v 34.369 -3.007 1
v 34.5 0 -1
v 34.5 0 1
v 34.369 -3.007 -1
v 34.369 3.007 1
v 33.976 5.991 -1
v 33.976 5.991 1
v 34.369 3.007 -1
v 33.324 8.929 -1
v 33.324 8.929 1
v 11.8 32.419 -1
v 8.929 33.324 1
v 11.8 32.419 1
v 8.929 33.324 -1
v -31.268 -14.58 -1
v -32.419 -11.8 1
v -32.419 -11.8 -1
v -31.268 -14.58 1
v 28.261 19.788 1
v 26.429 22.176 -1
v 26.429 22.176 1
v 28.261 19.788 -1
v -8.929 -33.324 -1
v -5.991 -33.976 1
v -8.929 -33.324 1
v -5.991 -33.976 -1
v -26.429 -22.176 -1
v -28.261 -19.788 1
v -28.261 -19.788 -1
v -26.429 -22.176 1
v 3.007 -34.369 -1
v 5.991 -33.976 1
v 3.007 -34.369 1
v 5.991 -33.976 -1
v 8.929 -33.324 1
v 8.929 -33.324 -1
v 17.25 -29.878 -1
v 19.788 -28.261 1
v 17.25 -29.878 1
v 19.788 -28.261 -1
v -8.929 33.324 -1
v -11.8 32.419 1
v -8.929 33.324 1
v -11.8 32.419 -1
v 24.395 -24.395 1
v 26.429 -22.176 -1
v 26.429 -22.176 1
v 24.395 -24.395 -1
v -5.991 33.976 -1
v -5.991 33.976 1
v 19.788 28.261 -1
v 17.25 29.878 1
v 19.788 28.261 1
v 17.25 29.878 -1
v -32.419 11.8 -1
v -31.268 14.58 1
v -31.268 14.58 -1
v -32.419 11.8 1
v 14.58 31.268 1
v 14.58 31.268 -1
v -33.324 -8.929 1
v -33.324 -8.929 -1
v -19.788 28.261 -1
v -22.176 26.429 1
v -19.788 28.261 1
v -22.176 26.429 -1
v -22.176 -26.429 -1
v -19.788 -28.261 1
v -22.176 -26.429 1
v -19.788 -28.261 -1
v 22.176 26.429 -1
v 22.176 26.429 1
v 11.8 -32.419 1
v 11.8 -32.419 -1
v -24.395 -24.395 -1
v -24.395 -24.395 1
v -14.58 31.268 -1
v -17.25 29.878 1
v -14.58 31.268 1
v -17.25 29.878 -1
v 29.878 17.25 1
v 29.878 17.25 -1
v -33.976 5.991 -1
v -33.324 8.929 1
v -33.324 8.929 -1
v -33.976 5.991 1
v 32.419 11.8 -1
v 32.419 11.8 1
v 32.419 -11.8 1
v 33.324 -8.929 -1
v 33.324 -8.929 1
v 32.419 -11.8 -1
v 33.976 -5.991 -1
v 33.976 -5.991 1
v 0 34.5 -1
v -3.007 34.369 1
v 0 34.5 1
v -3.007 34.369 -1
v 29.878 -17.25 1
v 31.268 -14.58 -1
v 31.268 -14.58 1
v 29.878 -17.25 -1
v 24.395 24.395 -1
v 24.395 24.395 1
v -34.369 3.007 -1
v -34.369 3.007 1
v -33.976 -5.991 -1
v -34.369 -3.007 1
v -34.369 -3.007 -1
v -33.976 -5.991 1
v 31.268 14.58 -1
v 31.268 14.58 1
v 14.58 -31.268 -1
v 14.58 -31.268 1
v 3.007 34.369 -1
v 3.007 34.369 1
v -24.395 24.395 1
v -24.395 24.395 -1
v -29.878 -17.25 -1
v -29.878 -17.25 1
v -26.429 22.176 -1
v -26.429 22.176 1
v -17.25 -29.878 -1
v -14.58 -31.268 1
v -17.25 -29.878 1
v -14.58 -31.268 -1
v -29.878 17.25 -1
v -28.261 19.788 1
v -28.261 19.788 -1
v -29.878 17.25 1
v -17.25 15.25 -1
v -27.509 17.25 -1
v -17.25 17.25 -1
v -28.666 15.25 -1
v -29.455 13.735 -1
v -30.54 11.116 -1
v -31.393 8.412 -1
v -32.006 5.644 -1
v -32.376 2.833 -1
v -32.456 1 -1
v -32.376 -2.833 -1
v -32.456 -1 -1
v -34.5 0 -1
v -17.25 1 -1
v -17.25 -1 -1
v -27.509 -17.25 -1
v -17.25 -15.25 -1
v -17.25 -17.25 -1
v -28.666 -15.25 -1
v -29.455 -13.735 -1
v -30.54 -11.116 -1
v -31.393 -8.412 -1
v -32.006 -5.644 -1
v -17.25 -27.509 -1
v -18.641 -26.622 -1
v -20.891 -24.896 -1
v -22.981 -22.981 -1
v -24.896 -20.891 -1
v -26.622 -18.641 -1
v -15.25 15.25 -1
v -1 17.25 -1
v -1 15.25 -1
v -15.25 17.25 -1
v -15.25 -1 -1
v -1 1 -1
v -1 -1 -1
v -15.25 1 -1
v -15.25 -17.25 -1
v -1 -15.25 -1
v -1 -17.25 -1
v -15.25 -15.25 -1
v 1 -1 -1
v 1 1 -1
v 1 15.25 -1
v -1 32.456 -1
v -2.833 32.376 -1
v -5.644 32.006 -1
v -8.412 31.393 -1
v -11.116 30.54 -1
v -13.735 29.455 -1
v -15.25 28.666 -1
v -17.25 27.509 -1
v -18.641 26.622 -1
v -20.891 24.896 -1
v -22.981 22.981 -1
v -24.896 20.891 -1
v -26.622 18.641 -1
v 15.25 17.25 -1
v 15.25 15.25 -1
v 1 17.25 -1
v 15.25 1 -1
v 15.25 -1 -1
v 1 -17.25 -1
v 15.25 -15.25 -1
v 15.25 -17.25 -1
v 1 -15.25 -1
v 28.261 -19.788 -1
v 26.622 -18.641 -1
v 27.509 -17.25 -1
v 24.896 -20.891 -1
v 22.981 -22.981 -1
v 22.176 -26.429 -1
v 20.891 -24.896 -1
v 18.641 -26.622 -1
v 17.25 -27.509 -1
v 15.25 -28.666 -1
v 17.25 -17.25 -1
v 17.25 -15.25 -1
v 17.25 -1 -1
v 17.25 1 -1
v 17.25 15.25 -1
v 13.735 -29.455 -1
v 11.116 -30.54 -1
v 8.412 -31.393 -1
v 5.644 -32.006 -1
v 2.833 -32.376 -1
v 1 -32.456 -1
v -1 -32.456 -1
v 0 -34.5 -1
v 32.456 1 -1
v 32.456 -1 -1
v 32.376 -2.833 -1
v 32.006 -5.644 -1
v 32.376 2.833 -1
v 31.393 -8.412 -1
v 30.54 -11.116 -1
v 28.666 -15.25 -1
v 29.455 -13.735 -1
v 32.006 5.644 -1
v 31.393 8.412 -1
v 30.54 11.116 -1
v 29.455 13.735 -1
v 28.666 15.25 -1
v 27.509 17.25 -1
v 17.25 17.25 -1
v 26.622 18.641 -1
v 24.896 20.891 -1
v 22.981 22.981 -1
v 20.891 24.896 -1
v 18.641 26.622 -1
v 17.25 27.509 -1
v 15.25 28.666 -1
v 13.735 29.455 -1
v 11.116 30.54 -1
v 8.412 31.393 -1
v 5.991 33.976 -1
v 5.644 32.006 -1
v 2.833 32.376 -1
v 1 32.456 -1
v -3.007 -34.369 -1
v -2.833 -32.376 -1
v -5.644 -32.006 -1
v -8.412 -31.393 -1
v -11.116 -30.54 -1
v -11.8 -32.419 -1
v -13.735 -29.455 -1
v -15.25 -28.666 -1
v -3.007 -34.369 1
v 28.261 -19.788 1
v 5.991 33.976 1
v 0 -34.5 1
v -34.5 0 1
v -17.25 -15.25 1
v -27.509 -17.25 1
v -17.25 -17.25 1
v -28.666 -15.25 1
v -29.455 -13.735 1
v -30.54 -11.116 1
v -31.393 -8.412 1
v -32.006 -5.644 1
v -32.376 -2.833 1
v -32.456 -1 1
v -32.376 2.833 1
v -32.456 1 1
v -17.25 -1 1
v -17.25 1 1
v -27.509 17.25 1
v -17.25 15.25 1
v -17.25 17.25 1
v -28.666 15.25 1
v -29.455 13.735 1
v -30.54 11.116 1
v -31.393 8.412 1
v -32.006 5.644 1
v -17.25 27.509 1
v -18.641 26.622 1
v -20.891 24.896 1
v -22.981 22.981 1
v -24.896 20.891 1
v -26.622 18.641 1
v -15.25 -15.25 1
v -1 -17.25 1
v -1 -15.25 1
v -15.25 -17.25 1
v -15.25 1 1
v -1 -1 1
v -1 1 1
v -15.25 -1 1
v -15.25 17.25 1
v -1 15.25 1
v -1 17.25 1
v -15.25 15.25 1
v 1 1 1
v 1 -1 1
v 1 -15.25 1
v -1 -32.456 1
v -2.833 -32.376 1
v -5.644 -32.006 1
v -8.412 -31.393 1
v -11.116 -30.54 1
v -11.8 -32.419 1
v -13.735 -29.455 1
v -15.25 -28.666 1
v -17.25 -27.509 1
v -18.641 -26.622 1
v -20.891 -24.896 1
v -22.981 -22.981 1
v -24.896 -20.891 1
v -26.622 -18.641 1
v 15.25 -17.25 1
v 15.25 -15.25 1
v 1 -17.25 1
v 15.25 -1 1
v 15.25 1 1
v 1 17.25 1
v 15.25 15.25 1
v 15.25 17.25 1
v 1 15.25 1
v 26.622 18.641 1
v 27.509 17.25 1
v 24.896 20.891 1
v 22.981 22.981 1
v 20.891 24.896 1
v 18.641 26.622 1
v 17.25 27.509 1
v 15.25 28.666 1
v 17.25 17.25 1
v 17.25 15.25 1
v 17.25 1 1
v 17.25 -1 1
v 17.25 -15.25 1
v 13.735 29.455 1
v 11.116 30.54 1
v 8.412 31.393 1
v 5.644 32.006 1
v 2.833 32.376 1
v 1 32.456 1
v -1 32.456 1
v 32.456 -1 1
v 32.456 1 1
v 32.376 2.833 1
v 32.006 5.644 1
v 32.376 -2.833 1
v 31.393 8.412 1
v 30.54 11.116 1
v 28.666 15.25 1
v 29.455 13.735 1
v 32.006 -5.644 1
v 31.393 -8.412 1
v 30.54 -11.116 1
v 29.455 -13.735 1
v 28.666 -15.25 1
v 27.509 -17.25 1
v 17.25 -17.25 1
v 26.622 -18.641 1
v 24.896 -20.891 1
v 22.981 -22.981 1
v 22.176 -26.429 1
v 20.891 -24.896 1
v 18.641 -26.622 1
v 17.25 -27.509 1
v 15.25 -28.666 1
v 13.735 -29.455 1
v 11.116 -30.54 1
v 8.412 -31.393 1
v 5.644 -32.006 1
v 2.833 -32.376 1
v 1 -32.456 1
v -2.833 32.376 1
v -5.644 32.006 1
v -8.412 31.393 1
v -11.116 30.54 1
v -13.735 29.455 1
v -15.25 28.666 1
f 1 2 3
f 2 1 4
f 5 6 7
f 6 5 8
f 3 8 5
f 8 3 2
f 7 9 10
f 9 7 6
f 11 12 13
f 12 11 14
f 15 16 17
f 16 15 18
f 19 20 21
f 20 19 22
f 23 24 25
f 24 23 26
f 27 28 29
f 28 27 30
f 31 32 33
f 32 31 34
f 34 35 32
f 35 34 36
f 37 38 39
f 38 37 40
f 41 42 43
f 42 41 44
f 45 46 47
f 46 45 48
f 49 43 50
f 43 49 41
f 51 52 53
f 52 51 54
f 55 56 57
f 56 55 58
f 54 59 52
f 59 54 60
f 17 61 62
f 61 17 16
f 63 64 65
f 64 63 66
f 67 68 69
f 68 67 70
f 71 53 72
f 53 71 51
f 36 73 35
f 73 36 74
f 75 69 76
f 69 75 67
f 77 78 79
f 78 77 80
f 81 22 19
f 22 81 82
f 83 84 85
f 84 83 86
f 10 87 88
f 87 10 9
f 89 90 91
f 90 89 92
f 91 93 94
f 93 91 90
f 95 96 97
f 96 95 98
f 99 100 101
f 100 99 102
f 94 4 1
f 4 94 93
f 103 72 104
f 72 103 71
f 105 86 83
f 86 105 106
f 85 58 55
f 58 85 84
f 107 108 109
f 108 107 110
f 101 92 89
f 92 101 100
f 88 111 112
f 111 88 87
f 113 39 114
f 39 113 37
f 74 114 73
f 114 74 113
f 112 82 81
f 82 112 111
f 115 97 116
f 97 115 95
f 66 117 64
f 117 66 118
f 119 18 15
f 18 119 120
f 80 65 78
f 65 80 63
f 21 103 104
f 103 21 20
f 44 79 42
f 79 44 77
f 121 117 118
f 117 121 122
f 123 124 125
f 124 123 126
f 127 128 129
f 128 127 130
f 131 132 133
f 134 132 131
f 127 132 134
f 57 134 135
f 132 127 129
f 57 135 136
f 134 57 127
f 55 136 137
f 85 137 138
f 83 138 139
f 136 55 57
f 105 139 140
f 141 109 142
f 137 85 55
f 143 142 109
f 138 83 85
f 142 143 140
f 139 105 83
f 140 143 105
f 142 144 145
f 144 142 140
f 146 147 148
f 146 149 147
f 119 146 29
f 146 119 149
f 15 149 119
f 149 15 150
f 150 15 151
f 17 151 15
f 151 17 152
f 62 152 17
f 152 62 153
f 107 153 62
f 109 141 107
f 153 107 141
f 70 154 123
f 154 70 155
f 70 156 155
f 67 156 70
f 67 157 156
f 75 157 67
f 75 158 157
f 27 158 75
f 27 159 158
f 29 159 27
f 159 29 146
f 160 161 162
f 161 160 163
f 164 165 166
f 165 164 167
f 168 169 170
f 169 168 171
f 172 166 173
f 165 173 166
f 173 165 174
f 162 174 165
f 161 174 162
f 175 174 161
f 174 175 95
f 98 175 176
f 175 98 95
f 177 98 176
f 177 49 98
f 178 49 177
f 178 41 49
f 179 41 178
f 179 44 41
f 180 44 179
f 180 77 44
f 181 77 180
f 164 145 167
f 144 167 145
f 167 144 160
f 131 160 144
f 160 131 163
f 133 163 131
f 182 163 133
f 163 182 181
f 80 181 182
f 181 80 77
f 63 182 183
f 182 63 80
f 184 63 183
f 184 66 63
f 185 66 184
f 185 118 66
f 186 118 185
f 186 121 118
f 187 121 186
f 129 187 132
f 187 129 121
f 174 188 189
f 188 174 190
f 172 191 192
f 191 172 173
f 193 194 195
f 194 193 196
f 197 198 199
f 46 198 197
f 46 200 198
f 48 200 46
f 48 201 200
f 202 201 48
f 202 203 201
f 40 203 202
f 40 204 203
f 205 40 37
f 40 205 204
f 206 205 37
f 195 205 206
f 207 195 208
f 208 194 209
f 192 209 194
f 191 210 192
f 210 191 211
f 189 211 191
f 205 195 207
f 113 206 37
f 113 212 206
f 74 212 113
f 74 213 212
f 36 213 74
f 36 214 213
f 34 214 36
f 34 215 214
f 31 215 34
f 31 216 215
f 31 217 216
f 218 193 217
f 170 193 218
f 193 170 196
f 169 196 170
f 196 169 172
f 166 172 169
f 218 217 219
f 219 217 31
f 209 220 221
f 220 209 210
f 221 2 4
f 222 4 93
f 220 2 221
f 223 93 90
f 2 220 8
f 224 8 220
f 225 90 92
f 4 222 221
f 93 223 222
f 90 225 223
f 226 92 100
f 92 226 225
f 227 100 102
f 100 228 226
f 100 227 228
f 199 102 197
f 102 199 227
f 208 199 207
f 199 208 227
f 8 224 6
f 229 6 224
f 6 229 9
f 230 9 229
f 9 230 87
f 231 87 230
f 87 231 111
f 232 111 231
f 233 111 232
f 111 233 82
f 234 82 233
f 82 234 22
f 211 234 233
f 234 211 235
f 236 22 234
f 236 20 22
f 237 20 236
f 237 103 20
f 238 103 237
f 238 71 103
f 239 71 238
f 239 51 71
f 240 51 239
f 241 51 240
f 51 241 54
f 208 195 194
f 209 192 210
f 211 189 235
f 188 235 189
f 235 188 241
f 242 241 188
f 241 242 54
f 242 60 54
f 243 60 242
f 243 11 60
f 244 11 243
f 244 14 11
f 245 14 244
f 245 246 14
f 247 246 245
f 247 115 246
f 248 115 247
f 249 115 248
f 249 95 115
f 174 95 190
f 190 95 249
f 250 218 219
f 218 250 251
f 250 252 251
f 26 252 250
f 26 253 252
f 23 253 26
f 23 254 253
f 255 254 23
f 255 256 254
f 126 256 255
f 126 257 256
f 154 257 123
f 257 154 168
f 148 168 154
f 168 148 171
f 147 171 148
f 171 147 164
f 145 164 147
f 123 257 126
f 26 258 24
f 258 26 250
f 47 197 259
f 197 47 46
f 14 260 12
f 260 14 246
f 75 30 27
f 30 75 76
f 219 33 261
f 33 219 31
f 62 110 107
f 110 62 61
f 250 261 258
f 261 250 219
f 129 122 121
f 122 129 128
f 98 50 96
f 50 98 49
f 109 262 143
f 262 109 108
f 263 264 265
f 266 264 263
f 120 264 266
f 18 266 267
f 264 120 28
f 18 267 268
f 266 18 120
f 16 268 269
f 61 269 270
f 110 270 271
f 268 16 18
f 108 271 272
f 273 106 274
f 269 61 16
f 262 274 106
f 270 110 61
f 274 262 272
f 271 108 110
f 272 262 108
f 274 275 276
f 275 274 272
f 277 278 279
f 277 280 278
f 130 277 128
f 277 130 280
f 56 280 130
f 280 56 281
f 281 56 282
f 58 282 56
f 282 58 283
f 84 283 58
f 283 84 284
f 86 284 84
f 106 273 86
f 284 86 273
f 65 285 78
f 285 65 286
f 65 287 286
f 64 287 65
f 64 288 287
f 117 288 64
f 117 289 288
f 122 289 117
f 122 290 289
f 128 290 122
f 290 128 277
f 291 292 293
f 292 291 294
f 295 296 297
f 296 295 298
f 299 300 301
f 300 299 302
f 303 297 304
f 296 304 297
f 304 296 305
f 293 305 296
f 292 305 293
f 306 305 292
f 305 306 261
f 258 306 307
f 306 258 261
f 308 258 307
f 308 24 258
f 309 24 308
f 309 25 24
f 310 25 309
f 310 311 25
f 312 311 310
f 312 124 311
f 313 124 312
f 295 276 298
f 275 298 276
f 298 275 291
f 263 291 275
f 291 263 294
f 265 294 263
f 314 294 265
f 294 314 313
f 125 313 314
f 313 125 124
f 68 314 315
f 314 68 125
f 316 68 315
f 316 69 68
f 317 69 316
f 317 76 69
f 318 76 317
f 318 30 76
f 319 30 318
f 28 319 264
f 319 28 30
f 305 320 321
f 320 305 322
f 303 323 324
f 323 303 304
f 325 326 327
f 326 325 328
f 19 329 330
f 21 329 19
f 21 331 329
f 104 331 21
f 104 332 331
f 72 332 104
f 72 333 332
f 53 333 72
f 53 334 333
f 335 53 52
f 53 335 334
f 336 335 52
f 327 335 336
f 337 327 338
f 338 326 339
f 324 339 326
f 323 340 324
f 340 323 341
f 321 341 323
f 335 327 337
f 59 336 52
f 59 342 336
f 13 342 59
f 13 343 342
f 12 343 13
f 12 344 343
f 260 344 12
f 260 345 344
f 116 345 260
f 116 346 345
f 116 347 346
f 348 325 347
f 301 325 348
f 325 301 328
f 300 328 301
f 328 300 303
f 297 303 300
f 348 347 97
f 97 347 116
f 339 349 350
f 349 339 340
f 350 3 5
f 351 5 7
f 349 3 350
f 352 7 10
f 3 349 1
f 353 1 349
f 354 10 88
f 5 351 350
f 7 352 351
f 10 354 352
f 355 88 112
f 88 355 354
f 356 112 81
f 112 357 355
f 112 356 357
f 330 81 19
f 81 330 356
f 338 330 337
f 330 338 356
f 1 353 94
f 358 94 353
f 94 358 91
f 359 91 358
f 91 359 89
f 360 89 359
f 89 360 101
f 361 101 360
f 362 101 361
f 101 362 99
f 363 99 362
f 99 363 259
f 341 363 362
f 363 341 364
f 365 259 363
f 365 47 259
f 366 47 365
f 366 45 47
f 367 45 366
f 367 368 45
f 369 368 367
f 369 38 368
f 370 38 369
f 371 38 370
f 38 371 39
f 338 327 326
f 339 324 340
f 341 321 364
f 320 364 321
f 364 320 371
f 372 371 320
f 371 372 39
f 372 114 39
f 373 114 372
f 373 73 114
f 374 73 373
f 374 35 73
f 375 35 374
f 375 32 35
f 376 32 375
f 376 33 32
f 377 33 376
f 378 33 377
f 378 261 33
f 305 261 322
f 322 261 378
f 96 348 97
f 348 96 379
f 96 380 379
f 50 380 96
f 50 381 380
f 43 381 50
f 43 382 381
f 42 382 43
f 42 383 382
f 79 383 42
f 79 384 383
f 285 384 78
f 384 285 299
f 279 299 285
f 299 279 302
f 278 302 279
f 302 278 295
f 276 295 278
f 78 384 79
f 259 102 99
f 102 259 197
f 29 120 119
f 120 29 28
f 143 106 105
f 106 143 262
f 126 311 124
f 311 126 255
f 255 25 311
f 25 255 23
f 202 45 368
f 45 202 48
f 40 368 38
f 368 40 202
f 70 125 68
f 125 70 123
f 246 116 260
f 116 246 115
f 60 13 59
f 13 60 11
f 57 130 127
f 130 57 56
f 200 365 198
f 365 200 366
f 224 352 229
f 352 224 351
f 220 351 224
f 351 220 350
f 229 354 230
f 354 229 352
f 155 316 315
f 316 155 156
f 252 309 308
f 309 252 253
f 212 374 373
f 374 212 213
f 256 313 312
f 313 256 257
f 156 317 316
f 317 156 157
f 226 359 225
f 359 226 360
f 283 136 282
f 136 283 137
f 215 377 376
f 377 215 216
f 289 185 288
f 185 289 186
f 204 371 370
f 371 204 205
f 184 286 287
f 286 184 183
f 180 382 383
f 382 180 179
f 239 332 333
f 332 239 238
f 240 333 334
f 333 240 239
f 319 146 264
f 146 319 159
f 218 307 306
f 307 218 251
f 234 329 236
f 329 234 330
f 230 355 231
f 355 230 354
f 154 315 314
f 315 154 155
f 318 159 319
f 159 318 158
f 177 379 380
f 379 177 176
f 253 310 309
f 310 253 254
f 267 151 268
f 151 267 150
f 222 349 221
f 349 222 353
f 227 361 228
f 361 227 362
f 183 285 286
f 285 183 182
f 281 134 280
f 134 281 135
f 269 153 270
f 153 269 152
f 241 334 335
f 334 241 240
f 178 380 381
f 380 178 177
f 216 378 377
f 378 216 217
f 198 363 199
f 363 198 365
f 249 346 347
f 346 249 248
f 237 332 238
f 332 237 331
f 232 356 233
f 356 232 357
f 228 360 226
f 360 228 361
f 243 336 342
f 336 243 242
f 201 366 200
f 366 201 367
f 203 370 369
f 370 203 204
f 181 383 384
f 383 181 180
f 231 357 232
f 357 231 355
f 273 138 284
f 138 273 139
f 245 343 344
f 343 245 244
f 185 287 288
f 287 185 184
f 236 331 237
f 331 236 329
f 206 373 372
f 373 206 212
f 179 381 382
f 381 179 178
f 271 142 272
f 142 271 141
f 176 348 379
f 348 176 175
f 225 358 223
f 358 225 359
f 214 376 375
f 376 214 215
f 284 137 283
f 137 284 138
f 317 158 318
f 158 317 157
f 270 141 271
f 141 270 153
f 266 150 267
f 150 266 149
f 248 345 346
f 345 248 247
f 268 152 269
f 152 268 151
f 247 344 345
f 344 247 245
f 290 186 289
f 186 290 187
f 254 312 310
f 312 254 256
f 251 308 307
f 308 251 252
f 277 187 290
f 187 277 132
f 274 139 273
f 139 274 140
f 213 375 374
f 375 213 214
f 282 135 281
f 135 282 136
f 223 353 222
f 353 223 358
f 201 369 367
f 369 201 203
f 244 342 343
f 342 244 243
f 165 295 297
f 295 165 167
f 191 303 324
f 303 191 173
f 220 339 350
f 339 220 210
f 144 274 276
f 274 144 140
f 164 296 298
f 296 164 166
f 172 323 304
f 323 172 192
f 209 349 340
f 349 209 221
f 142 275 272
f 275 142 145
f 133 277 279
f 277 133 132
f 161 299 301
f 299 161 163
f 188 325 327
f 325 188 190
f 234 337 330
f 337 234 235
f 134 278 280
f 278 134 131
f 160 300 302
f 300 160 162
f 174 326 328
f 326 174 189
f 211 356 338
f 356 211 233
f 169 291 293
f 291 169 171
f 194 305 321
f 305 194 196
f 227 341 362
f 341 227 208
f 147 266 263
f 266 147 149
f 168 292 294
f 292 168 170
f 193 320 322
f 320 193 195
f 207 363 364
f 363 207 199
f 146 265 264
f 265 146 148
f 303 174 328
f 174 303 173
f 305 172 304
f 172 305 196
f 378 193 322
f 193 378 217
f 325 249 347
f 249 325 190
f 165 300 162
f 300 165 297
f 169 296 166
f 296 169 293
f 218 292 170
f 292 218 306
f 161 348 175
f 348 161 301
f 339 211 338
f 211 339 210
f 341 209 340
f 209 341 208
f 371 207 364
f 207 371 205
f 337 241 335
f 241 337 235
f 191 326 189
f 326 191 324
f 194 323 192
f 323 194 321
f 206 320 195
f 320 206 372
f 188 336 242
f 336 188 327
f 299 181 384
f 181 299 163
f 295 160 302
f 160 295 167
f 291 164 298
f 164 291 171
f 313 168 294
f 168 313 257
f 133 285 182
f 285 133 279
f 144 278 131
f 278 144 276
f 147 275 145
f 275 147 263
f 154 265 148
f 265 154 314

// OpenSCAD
diam     = 65;
slatw    = 2;
height   = 2;

$fn = 72;


difference(){
    union(){
        cube([diam, slatw, height], center = true);
        translate([0,diam/4,0]){
            cube([diam, slatw, height], center = true);
        }
        translate([0,-diam/4,0]){
            cube([diam, slatw, height], center = true);
        }
        
        cube([slatw, diam, height], center = true);
        translate([diam/4,0,0]){
            cube([slatw, diam, height], center = true);
        }
        translate([-diam/4,0,0]){
            cube([slatw, diam, height], center = true);
        }
        
        difference(){
            cylinder(h = height, d = diam + (2*slatw), center = true);
            cylinder(h = height, d = diam, center = true);
        }
    }

    difference(){
        cube([diam+(2*slatw), diam+(2*slatw), height], center = true);
        cylinder(h = height, d = diam + (2*slatw), center = true);
    }

}
